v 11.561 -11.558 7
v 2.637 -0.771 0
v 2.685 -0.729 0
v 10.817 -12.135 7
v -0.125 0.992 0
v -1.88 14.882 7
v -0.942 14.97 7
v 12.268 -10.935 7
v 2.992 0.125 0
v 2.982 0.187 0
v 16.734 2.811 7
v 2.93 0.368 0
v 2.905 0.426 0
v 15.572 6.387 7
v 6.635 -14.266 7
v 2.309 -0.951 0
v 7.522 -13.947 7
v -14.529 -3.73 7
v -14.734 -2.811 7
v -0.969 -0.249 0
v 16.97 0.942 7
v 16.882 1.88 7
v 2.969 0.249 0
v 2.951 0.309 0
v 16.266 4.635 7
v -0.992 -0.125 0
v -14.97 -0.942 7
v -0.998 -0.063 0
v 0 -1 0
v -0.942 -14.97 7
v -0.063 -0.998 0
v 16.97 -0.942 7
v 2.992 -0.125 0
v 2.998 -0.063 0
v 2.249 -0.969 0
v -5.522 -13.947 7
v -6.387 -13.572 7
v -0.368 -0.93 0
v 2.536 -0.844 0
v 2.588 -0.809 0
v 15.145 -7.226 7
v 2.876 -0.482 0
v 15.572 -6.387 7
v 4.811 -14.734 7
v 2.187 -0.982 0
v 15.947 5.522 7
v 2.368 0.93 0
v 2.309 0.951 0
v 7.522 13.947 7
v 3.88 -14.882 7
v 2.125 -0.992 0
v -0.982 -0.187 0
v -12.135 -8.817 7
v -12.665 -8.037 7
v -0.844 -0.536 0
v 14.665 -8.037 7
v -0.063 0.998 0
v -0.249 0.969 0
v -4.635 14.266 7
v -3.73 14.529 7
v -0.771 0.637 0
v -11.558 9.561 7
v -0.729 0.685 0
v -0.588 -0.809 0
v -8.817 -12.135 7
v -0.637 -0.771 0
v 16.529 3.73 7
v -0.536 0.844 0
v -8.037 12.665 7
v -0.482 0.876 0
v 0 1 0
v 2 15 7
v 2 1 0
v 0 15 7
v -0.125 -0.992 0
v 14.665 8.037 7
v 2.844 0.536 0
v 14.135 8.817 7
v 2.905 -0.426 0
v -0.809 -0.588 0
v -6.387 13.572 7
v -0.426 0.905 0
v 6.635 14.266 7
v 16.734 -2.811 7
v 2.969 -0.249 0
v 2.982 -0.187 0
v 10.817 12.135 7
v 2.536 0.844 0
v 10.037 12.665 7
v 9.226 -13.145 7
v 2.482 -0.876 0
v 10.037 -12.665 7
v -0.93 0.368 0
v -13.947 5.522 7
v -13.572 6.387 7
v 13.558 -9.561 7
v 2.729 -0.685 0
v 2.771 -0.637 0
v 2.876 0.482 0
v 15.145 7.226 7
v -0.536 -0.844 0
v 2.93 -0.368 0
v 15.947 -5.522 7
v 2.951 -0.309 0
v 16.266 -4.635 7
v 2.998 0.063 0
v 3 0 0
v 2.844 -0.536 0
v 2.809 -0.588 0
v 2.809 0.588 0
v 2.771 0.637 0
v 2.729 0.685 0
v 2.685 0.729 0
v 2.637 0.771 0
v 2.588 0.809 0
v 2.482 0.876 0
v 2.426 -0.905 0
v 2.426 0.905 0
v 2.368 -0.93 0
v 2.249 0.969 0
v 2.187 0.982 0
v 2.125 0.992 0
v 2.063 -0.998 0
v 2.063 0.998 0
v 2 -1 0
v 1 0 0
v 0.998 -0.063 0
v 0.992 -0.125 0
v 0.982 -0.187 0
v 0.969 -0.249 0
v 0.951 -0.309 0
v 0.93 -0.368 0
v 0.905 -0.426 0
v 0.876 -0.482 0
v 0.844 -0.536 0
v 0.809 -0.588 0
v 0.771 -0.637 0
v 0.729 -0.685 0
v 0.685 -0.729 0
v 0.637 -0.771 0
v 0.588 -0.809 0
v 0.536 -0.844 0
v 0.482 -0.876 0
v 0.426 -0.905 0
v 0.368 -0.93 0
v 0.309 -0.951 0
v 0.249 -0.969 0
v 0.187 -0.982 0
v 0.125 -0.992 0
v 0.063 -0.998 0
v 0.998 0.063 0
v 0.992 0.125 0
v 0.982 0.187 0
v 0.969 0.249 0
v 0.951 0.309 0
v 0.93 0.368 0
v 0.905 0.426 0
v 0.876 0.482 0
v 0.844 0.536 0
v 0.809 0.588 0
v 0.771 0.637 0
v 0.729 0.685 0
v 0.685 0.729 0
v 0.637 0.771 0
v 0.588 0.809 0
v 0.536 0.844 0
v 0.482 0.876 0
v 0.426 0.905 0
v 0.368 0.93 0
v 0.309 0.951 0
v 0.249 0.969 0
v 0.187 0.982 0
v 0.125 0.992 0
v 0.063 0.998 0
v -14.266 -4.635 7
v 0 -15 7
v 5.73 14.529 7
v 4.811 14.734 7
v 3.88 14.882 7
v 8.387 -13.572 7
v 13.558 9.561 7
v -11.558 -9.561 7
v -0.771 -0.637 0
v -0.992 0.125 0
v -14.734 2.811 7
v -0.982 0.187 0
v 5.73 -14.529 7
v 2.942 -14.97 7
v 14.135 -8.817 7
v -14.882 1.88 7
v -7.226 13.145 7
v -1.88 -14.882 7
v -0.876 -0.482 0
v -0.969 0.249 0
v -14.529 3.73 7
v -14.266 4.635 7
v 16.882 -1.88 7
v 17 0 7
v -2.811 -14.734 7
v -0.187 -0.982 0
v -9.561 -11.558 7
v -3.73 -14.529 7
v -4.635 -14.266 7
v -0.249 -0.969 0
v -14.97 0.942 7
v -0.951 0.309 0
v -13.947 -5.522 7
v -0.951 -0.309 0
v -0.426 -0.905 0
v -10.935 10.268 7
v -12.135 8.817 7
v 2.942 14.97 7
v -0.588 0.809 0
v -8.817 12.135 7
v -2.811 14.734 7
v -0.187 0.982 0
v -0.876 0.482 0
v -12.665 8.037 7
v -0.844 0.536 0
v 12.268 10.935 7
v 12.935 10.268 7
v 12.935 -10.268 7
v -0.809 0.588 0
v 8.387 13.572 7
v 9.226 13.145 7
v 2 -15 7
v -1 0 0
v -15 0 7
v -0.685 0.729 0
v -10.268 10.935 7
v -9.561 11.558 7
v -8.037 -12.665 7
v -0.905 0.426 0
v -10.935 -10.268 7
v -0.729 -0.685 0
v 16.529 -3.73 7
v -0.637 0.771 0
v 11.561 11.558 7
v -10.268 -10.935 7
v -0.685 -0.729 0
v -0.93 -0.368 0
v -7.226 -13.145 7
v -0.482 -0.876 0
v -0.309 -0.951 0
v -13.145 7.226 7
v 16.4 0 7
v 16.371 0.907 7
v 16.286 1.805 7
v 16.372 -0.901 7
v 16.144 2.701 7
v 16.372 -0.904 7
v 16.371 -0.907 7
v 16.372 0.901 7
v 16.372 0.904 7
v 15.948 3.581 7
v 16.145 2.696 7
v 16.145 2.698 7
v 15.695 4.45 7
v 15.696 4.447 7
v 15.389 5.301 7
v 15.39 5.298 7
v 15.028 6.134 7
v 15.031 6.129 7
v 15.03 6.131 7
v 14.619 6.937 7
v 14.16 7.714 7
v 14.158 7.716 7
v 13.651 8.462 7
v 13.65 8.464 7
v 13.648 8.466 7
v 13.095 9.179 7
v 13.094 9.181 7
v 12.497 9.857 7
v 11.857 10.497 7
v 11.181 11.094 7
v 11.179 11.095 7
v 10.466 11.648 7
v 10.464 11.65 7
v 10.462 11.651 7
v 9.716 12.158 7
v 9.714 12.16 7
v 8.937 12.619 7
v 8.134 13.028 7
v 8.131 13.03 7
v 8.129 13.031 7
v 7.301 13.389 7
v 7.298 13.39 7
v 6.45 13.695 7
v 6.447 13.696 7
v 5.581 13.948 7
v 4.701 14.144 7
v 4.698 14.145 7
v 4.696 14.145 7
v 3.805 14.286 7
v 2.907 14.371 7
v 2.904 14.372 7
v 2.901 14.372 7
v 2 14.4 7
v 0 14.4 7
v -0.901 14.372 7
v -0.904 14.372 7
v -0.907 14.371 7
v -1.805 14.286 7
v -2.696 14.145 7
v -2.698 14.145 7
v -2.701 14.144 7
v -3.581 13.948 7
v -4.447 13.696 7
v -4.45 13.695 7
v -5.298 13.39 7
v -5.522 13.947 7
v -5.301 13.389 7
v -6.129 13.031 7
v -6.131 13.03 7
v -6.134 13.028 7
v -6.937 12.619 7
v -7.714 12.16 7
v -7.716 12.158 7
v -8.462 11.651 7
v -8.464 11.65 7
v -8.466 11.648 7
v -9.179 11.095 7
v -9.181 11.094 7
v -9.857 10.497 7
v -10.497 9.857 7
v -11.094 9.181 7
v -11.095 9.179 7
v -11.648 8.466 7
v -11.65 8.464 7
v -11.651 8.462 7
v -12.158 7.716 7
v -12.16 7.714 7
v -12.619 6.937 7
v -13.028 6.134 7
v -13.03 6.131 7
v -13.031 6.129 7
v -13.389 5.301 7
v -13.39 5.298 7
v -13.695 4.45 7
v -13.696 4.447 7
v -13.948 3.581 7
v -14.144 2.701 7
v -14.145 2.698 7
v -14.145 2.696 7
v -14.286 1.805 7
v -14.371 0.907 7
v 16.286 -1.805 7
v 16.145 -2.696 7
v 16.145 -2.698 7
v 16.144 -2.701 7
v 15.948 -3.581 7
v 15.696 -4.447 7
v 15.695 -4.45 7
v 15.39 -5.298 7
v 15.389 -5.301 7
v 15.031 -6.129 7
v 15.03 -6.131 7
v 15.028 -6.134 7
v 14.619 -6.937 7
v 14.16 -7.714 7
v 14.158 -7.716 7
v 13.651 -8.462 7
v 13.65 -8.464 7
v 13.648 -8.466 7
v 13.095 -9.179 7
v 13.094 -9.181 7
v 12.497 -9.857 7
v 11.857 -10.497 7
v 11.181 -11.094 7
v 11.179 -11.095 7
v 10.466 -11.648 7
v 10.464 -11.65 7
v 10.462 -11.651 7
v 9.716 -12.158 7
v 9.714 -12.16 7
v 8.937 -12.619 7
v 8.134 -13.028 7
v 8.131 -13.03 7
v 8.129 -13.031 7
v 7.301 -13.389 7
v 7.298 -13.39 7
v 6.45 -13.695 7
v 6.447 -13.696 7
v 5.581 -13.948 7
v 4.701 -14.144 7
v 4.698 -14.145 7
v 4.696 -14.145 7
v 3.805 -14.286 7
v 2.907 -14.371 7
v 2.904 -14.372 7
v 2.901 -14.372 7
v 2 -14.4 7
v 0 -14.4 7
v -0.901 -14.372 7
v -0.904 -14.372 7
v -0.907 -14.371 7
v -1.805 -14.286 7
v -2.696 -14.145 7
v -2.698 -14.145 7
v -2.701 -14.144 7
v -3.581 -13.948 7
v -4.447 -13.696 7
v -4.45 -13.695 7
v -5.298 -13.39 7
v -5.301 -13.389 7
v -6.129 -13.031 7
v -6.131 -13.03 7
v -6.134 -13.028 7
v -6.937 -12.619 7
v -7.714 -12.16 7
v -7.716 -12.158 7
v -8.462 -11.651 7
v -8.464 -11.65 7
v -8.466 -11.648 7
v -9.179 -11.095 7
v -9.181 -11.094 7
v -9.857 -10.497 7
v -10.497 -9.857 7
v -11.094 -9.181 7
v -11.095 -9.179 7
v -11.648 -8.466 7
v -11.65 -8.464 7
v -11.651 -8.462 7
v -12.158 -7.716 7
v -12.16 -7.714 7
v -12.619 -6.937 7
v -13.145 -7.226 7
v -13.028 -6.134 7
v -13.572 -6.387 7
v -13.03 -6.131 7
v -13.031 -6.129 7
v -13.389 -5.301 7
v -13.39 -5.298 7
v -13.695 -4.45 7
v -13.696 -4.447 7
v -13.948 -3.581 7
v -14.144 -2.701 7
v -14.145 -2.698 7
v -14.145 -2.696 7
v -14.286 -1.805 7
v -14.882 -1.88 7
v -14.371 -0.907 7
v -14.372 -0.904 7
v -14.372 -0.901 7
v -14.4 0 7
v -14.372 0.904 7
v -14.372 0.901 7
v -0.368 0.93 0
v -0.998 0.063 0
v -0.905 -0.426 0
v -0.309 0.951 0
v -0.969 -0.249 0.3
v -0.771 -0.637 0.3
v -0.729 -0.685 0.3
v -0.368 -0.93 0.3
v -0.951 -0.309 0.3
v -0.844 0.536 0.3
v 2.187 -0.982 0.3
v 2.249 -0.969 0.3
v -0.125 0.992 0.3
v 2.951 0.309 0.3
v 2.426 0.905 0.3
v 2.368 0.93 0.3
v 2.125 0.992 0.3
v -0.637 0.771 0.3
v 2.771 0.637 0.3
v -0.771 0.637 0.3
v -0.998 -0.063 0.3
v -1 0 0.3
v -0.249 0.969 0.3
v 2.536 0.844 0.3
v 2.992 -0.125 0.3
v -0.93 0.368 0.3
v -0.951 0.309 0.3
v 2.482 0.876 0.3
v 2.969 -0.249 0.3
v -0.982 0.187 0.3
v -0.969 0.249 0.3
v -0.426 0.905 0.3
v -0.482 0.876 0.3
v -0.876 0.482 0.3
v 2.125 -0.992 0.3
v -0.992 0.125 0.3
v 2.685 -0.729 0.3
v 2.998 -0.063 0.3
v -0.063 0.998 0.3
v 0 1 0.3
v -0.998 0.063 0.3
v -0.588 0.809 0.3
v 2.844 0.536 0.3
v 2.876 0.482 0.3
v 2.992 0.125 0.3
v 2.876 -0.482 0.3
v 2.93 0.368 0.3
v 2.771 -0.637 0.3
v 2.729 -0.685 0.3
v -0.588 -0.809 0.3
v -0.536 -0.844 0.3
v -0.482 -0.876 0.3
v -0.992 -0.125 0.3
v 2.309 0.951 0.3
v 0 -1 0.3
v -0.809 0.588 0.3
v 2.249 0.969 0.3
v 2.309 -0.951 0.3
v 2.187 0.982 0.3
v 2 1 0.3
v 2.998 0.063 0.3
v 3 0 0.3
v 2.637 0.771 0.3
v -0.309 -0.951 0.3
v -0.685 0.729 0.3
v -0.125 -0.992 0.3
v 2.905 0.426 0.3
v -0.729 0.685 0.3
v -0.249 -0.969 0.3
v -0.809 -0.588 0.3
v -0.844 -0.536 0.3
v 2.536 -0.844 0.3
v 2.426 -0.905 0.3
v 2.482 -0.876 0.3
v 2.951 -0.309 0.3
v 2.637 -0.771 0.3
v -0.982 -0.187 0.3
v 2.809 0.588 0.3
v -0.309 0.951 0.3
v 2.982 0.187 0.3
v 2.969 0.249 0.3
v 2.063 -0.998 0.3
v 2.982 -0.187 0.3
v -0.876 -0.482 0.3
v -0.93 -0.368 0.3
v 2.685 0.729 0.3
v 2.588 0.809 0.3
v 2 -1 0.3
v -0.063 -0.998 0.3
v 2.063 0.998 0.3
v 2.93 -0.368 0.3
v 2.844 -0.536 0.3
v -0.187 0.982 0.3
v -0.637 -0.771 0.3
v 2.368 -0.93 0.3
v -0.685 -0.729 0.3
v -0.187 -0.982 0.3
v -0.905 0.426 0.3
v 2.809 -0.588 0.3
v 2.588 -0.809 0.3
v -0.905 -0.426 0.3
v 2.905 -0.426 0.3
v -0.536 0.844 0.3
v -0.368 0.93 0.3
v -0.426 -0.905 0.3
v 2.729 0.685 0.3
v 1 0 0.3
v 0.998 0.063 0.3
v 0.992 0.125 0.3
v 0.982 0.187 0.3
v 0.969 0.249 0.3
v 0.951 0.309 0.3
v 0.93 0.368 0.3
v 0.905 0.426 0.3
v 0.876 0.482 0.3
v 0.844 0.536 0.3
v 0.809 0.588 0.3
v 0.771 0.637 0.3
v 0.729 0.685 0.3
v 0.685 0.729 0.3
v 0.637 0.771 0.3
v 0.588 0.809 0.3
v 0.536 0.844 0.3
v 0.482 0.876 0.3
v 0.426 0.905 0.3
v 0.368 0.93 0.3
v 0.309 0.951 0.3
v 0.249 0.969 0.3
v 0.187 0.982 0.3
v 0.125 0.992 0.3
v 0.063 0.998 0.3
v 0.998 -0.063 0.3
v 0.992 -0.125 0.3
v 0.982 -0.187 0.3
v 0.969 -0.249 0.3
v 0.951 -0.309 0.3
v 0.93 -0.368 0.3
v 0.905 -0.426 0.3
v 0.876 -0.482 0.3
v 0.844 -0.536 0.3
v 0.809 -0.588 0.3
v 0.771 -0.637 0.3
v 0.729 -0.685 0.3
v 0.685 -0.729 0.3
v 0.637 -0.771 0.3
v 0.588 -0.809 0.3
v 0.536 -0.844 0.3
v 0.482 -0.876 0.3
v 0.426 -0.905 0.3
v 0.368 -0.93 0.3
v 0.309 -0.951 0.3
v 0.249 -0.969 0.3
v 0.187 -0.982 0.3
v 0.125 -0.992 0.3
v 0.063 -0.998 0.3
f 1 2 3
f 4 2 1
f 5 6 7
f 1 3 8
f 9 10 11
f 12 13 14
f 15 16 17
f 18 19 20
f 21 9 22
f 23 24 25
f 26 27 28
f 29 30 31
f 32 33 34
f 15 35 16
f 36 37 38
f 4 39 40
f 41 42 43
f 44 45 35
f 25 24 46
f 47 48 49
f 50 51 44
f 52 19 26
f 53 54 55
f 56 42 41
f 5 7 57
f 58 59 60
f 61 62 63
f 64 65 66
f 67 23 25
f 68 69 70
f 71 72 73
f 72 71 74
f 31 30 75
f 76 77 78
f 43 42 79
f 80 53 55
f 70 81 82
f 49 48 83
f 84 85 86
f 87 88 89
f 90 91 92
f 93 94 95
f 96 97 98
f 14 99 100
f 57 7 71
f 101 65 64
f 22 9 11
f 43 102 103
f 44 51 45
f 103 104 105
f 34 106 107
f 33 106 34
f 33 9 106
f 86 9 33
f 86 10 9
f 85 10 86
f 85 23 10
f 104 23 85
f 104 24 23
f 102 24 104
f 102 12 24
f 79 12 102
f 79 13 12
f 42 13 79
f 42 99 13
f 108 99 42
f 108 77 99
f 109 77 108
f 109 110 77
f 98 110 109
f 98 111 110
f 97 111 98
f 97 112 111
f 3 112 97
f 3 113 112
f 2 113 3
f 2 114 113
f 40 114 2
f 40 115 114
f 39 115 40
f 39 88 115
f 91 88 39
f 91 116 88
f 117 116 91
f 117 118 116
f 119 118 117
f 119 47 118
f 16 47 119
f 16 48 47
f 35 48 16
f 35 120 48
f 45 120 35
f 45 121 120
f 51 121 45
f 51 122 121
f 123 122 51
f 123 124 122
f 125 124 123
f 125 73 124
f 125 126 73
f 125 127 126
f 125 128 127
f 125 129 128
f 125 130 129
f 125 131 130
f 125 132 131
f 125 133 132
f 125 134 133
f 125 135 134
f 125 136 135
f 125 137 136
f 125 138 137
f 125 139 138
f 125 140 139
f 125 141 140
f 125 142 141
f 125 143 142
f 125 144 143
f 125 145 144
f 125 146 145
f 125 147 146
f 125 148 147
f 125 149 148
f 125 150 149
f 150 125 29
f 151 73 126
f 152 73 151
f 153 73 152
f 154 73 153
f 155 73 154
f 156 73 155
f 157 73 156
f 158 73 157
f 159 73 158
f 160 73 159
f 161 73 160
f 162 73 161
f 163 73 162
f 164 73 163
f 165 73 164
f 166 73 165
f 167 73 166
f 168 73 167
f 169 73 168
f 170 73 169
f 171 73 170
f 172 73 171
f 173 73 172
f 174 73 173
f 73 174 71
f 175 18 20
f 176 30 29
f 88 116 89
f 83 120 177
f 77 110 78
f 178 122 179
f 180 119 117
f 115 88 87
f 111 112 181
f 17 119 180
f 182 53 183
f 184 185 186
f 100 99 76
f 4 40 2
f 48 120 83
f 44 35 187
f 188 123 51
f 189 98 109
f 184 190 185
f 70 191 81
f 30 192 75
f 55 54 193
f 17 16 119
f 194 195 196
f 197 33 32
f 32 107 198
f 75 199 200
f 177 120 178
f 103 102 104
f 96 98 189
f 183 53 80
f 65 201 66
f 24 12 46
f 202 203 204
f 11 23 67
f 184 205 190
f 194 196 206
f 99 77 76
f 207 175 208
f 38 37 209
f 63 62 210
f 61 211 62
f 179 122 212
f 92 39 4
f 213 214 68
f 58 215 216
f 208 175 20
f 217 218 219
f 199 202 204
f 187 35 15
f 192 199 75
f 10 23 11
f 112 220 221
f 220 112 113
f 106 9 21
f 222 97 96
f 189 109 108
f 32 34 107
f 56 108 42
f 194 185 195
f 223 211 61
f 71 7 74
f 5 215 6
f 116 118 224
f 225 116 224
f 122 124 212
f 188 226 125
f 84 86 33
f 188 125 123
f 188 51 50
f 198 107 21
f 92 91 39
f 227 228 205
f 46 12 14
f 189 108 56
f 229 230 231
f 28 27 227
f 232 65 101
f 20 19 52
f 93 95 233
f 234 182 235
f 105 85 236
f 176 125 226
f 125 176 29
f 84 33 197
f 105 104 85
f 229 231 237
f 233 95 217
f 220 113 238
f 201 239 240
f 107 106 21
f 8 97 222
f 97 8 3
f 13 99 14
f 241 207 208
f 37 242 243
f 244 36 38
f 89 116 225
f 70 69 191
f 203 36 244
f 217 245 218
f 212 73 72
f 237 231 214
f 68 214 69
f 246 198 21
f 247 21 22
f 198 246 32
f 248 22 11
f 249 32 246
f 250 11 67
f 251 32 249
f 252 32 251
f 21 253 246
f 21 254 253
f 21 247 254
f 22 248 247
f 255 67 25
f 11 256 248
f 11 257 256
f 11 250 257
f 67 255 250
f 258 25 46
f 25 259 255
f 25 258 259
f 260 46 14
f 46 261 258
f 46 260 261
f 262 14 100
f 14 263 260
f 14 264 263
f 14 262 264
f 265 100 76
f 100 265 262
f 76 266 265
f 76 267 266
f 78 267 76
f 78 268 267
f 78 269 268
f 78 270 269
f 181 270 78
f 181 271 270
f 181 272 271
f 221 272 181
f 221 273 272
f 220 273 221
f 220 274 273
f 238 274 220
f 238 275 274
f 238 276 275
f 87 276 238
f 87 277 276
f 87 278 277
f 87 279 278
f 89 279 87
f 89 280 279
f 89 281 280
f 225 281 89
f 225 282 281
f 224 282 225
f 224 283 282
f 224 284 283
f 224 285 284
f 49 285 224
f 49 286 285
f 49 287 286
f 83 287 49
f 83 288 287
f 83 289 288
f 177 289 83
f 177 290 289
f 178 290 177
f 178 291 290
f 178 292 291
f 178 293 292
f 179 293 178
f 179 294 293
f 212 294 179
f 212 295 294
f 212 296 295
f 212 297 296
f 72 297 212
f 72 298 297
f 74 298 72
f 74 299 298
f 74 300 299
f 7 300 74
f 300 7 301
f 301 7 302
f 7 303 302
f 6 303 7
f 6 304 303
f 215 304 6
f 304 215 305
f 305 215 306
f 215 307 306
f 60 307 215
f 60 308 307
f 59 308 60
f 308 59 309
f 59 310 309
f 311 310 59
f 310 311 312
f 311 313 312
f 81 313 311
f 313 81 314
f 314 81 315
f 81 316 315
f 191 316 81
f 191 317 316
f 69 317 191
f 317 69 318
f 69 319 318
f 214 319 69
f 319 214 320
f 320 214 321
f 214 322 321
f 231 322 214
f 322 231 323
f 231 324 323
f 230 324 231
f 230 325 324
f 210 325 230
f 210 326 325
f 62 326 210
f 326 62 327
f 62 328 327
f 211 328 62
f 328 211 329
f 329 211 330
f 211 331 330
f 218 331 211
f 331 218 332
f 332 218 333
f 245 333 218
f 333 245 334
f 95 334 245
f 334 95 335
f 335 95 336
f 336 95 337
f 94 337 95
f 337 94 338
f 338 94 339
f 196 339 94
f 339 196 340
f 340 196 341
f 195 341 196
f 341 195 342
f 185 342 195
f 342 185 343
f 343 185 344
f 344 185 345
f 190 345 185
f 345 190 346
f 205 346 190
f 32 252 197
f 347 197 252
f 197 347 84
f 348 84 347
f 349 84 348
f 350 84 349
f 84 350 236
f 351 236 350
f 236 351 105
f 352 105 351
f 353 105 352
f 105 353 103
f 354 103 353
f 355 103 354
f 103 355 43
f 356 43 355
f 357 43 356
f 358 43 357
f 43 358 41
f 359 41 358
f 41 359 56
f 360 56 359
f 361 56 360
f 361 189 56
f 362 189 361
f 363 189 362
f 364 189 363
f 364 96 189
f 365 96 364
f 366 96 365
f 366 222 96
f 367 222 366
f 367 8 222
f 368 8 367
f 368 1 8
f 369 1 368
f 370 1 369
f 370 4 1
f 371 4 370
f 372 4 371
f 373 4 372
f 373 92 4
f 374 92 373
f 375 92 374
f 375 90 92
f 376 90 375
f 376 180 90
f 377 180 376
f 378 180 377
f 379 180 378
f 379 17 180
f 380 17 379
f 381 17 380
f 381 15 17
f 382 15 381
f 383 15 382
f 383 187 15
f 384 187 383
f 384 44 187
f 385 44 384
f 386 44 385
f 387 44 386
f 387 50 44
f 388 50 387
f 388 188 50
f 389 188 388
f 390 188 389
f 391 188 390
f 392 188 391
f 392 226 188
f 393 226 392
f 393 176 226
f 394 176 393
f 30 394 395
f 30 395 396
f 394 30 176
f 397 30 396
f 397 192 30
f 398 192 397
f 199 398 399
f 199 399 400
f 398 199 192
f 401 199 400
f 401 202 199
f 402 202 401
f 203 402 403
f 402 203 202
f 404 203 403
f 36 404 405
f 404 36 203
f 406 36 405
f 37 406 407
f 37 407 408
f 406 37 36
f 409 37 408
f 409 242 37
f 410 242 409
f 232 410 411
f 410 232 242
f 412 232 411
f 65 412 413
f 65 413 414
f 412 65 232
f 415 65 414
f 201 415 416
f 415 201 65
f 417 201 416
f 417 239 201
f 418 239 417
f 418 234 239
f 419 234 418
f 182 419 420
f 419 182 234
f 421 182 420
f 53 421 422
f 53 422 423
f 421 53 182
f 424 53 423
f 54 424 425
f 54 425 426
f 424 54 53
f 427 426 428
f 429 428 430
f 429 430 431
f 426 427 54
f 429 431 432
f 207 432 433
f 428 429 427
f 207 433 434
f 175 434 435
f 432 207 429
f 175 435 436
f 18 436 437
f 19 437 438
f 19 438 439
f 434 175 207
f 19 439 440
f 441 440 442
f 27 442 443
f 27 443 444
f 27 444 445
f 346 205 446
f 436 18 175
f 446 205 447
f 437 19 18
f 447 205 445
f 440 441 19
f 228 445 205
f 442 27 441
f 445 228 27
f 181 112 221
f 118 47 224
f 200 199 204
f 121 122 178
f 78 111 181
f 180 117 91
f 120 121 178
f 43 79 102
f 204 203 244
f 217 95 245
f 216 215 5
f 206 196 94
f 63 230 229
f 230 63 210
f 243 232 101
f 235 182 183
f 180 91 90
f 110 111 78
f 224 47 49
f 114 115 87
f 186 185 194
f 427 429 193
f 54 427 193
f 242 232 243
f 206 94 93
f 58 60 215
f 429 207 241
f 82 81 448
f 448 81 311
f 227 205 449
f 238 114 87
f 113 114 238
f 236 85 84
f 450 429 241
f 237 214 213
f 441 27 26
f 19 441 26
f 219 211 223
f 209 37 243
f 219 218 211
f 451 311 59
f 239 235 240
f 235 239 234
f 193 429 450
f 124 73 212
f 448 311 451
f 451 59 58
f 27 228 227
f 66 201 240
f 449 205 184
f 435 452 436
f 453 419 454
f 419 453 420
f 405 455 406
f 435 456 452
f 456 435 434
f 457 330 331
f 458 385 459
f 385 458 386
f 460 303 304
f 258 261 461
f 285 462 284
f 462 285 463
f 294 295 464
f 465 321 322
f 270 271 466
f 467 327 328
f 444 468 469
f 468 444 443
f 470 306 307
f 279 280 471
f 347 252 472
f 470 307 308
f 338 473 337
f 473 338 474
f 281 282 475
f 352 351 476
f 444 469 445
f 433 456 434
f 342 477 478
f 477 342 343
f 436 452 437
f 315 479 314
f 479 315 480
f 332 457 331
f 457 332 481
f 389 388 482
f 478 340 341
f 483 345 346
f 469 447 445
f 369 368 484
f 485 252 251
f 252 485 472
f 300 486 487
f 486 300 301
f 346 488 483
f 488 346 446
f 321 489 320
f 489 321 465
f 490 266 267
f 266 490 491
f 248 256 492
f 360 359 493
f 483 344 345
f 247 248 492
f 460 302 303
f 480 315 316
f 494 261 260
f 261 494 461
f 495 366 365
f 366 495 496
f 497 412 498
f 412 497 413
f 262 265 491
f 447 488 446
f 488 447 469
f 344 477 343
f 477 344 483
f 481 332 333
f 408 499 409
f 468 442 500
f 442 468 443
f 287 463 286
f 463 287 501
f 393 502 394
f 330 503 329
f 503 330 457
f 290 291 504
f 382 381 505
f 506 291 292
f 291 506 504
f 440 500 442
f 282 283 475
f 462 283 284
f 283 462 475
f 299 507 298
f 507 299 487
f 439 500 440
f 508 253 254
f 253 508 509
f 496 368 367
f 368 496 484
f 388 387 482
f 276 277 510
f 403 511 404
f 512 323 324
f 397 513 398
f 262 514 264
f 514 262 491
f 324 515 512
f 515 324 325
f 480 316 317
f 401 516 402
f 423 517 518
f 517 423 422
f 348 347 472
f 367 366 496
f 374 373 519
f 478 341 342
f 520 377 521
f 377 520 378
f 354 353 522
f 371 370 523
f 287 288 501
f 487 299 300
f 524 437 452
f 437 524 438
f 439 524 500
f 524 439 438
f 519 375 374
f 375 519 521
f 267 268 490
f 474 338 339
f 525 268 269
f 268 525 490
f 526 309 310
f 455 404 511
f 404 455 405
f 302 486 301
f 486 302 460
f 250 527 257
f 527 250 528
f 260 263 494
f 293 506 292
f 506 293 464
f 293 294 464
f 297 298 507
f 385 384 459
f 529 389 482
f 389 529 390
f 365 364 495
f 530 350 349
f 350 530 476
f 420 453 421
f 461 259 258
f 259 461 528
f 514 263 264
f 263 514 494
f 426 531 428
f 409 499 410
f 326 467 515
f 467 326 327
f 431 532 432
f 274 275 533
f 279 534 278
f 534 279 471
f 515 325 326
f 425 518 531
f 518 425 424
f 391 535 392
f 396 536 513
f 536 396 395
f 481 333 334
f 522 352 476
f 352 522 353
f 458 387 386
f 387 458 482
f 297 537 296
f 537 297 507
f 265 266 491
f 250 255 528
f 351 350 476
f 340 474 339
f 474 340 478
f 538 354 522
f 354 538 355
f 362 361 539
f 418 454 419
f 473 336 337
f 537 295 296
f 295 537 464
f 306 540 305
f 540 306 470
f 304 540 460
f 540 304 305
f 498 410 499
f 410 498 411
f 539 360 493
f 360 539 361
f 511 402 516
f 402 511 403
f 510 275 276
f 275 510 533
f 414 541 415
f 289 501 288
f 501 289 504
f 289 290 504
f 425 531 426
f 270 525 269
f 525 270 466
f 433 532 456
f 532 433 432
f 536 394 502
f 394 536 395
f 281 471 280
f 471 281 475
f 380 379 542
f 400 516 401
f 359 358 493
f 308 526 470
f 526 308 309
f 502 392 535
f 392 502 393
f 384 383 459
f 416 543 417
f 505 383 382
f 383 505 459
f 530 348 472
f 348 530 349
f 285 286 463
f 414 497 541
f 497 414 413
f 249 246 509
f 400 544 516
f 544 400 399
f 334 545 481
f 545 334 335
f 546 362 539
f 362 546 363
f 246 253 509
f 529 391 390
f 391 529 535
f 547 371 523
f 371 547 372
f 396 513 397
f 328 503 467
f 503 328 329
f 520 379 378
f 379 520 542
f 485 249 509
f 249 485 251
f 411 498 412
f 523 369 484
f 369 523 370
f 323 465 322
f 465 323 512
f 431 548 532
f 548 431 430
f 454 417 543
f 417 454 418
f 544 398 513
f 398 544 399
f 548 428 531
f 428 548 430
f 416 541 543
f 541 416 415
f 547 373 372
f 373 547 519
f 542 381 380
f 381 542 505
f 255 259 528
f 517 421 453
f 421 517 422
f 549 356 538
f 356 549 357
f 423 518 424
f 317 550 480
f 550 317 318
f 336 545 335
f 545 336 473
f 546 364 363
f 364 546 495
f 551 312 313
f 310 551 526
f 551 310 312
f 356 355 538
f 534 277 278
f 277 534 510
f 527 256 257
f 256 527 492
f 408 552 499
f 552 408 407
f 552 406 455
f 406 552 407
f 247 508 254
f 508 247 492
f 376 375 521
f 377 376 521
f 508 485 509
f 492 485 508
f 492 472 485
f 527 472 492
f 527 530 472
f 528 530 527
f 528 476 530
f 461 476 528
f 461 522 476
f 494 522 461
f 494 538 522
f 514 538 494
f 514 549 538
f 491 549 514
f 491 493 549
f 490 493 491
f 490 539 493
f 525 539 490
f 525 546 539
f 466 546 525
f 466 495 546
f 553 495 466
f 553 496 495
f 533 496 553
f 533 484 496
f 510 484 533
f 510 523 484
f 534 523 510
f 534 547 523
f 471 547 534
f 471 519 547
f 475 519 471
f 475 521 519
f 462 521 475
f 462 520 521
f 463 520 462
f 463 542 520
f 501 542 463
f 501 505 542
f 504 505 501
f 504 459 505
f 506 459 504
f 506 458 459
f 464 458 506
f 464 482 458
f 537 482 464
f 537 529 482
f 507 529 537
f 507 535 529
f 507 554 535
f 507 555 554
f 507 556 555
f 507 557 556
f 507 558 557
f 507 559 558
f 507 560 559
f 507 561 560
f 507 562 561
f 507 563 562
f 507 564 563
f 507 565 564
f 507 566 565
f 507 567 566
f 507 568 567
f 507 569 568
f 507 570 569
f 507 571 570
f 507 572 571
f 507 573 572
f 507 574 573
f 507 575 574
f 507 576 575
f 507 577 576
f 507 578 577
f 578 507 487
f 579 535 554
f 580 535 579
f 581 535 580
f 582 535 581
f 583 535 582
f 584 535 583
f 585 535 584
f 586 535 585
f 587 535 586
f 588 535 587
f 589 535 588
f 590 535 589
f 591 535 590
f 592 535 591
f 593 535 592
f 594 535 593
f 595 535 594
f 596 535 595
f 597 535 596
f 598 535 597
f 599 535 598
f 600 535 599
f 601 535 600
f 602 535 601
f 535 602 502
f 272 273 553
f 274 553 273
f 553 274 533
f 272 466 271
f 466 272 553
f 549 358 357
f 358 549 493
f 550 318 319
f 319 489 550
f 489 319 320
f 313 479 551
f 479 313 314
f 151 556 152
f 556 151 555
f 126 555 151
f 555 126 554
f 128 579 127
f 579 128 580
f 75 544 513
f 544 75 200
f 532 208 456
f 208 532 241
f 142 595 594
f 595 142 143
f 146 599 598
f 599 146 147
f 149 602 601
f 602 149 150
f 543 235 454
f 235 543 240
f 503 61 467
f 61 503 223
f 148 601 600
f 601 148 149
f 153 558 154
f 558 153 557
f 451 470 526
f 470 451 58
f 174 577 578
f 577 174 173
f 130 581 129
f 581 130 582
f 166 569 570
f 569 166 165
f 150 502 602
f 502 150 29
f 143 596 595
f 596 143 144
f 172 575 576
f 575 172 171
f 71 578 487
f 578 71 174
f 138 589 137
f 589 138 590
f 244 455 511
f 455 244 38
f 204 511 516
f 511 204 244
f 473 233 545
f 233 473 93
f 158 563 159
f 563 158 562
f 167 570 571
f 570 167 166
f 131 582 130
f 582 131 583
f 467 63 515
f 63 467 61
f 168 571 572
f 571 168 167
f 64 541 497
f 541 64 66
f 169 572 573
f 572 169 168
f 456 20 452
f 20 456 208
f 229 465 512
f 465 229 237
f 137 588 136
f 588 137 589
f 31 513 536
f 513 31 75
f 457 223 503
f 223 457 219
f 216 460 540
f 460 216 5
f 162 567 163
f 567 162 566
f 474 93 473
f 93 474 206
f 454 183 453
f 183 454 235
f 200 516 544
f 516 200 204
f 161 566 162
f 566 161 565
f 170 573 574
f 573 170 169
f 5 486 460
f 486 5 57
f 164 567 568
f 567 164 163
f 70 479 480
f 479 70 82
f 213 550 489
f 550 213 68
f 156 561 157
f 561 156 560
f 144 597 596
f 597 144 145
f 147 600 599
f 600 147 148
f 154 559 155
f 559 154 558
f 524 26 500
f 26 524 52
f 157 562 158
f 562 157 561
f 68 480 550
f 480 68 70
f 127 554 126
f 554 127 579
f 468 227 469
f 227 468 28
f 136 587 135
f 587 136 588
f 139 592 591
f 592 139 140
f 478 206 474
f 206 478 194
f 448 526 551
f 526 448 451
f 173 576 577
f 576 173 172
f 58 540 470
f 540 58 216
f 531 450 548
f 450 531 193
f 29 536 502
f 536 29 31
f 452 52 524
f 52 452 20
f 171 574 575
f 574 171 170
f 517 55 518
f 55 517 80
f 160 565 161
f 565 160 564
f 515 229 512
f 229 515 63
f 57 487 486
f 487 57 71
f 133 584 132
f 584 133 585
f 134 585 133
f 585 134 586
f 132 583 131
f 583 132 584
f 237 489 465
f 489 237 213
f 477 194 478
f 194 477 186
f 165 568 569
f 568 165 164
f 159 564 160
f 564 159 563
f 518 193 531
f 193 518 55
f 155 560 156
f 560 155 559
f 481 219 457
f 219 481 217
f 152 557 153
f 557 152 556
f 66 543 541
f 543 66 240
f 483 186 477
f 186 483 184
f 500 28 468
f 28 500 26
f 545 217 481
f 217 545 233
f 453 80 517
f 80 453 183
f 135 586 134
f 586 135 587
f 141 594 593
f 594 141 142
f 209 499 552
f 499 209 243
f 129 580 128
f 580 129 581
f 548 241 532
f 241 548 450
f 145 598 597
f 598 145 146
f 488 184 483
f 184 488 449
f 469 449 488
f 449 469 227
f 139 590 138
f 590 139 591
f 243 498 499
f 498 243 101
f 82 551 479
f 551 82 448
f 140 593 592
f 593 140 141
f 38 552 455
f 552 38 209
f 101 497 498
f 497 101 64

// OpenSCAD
$fn=100;
headplate();

module headplate(){
    hole_d=2;
    height = 7;
    offset_h = 2;
    difference(){
        hull(){
            cylinder(d1=hole_d, d2=30, h=height);
            translate([offset_h,0,0])
            cylinder(d1=hole_d, d2=30, h=height);
        }
        translate([0,0,0.3])
        hull(){
            cylinder(d1=hole_d, d2=30, h=height);
            translate([offset_h,0,0])
            cylinder(d1=hole_d, d2=30, h=height);
        }
        
        translate([0,0,-1])
        cylinder(d=hole_d, h=height);
    }
}
